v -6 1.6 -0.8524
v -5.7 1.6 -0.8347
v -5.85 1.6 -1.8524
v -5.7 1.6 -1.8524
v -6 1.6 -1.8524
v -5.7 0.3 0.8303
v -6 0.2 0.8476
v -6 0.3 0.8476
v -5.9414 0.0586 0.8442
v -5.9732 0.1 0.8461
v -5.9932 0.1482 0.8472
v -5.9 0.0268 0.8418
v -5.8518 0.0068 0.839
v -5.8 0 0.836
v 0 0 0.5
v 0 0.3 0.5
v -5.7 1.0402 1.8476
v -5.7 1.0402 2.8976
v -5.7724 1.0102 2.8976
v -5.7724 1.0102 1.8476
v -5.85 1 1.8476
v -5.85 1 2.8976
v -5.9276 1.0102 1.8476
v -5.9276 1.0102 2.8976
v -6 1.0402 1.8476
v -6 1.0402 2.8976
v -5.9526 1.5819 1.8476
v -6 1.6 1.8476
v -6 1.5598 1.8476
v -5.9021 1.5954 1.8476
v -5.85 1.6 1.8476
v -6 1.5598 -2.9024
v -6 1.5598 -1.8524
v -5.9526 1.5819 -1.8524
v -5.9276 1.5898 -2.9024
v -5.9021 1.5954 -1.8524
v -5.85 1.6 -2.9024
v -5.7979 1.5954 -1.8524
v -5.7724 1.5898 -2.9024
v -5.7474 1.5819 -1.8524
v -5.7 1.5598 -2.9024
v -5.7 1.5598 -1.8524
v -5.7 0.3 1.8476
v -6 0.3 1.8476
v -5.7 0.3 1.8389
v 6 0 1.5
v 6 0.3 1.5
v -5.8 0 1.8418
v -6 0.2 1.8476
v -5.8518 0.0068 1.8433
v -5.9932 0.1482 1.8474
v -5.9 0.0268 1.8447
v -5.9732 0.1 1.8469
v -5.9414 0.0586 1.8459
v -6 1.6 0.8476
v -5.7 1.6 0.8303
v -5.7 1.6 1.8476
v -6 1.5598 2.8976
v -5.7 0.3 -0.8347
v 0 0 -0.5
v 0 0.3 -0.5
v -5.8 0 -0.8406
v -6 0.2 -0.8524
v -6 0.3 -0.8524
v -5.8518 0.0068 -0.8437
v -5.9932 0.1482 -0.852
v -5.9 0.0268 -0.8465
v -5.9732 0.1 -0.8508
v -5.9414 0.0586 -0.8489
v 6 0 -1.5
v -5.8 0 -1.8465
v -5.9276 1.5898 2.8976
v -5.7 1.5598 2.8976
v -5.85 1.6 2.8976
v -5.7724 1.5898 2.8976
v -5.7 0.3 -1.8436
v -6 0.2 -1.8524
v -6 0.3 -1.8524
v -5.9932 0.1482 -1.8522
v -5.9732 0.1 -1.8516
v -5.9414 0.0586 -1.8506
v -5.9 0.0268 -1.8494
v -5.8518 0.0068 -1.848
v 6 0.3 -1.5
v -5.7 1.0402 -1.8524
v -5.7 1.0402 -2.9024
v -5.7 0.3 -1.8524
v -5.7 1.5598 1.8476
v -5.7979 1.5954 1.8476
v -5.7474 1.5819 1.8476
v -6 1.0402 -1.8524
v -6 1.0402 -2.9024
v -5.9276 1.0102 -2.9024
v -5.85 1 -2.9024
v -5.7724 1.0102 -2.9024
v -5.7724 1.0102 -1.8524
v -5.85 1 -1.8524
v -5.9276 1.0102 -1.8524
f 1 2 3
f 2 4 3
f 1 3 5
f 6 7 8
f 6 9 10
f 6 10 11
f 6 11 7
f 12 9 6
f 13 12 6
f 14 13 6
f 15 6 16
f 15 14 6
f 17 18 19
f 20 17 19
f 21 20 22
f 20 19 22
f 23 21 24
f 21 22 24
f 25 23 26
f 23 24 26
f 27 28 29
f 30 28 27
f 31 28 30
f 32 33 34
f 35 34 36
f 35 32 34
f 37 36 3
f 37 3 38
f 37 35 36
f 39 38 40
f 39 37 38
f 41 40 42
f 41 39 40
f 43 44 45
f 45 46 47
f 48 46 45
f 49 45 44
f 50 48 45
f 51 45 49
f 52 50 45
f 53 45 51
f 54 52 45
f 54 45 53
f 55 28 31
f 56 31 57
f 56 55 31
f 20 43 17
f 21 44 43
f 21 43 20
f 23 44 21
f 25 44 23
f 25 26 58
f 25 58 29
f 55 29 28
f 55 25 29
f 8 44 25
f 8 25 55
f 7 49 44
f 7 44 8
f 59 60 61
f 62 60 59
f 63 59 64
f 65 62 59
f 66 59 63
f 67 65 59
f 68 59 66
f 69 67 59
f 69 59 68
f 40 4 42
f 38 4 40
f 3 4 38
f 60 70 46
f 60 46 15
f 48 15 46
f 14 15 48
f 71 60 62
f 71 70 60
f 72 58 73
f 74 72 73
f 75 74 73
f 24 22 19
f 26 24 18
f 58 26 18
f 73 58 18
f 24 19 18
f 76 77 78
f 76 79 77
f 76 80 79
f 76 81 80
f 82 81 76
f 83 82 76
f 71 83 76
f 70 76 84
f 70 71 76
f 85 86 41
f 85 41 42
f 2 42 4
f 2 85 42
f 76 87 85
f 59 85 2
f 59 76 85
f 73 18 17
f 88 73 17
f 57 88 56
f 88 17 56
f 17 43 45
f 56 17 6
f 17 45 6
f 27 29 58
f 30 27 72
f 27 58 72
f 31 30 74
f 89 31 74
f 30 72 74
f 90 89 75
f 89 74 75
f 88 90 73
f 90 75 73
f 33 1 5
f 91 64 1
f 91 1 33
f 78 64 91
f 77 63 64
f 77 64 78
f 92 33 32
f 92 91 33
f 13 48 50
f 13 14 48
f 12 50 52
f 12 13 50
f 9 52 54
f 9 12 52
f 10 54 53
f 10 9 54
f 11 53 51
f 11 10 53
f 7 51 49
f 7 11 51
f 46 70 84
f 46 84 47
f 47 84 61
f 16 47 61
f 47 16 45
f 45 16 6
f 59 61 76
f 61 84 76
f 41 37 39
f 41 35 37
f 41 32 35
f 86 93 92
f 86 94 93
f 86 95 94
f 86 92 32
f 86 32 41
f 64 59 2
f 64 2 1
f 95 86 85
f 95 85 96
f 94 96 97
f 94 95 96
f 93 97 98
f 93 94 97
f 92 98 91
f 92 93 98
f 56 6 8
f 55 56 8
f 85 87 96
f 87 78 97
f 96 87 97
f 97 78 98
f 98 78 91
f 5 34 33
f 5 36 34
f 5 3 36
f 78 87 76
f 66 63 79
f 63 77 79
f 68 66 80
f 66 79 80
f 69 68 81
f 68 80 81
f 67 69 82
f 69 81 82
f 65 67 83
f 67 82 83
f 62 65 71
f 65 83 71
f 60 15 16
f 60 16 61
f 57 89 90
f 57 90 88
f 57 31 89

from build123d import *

# Parameters (mm, degrees)
BOSS_EXTRUDE1_DEPTH = 0.3
BOSS_EXTRUDE2_DEPTH = 1.3
SKETCH3_W           = 1.05
SKETCH3_H           = 0.7
CUT_EXTRUDE1_DEPTH  = 0.3
FILLET1_R           = 0.2
SKETCH4_OUTSIDE_W   = 16.684
SKETCH4_OUTSIDE_H   = 6.284
CUT_EXTRUDE3_DEPTH  = 1.05
SKETCH5_OUTSIDE_W   = 16.684
SKETCH5_OUTSIDE_H   = 6.284
CUT_EXTRUDE4_DEPTH  = 1.05


with BuildPart() as part:
    # Sketch1 → Boss-Extrude1 (new body)
    with BuildSketch(Plane(origin=(0, 0, 0), x_dir=(1, 0, 0), z_dir=(0, 1, 0))):
        Polygon((-6, 1.85236673), (6, 1.5), (6, -1.5), (-6, -1.84763327), (-6, -0.84763327), (0, -0.5), (0, 0.5), (-6, 0.85236673), align=None)
    extrude(amount=BOSS_EXTRUDE1_DEPTH)

    # Sketch2 → Boss-Extrude2 (add)
    with BuildSketch(Plane(origin=(0, 0.3, 0), x_dir=(1, 0, 0), z_dir=(0, 1, 0))):
        Polygon((-6, 0.85236673), (-6, 2.90236673), (-5.7, 2.90236673), (-5.7, 0.834748394), align=None)
        Polygon((-6, -0.84763327), (-6, -2.89763327), (-5.7, -2.89763327), (-5.7, -0.830251606), align=None)
    extrude(amount=BOSS_EXTRUDE2_DEPTH)

    # Sketch3 → Cut-Extrude1 (cut)
    with BuildSketch(Plane.ZY.offset(6)):
        with Locations((-2.37736673, 0.65)):
            Rectangle(SKETCH3_W, SKETCH3_H)
        with Locations((2.37263327, 0.65)):
            Rectangle(SKETCH3_W, SKETCH3_H)
    extrude(amount=-CUT_EXTRUDE1_DEPTH, mode=Mode.SUBTRACT)

    # Fillet1
    fillet1_edges = [part.edges().sort_by_distance(p)[0] for p in [
        (-6, 0, -1.35236673),
        (-6, 0, 1.34763327),
    ]]
    fillet(fillet1_edges, radius=FILLET1_R)

    # Sketch4 outside → Cut-Extrude3 (cut)
    with BuildSketch(Plane(origin=(0, 0, -2.90236673), x_dir=(-1, 0, 0), z_dir=(0, 0, -1))):
        with Locations((0, 0.8)):
            Rectangle(SKETCH4_OUTSIDE_W, SKETCH4_OUTSIDE_H)
        with BuildLine():
            Line((5.7, 1.559807621), (5.7, 1.040192379))
            ThreePointArc((5.7, 1.040192379), (5.85, 1), (6, 1.040192379))
            Line((6, 1.040192379), (6, 1.559807621))
            ThreePointArc((6, 1.559807621), (5.85, 1.6), (5.7, 1.559807621))
        make_face(mode=Mode.SUBTRACT)
    extrude(amount=-CUT_EXTRUDE3_DEPTH, mode=Mode.SUBTRACT)

    # Sketch5 outside → Cut-Extrude4 (cut)
    with BuildSketch(Plane.XY.offset(2.89763327)):
        with Locations((0, 0.8)):
            Rectangle(SKETCH5_OUTSIDE_W, SKETCH5_OUTSIDE_H)
        with BuildLine():
            Line((-5.7, 1.559807621), (-5.7, 1.040192379))
            ThreePointArc((-5.7, 1.040192379), (-5.85, 1), (-6, 1.040192379))
            Line((-6, 1.040192379), (-6, 1.559807621))
            ThreePointArc((-6, 1.559807621), (-5.85, 1.6), (-5.7, 1.559807621))
        make_face(mode=Mode.SUBTRACT)
    extrude(amount=-CUT_EXTRUDE4_DEPTH, mode=Mode.SUBTRACT)


solid = part.part
